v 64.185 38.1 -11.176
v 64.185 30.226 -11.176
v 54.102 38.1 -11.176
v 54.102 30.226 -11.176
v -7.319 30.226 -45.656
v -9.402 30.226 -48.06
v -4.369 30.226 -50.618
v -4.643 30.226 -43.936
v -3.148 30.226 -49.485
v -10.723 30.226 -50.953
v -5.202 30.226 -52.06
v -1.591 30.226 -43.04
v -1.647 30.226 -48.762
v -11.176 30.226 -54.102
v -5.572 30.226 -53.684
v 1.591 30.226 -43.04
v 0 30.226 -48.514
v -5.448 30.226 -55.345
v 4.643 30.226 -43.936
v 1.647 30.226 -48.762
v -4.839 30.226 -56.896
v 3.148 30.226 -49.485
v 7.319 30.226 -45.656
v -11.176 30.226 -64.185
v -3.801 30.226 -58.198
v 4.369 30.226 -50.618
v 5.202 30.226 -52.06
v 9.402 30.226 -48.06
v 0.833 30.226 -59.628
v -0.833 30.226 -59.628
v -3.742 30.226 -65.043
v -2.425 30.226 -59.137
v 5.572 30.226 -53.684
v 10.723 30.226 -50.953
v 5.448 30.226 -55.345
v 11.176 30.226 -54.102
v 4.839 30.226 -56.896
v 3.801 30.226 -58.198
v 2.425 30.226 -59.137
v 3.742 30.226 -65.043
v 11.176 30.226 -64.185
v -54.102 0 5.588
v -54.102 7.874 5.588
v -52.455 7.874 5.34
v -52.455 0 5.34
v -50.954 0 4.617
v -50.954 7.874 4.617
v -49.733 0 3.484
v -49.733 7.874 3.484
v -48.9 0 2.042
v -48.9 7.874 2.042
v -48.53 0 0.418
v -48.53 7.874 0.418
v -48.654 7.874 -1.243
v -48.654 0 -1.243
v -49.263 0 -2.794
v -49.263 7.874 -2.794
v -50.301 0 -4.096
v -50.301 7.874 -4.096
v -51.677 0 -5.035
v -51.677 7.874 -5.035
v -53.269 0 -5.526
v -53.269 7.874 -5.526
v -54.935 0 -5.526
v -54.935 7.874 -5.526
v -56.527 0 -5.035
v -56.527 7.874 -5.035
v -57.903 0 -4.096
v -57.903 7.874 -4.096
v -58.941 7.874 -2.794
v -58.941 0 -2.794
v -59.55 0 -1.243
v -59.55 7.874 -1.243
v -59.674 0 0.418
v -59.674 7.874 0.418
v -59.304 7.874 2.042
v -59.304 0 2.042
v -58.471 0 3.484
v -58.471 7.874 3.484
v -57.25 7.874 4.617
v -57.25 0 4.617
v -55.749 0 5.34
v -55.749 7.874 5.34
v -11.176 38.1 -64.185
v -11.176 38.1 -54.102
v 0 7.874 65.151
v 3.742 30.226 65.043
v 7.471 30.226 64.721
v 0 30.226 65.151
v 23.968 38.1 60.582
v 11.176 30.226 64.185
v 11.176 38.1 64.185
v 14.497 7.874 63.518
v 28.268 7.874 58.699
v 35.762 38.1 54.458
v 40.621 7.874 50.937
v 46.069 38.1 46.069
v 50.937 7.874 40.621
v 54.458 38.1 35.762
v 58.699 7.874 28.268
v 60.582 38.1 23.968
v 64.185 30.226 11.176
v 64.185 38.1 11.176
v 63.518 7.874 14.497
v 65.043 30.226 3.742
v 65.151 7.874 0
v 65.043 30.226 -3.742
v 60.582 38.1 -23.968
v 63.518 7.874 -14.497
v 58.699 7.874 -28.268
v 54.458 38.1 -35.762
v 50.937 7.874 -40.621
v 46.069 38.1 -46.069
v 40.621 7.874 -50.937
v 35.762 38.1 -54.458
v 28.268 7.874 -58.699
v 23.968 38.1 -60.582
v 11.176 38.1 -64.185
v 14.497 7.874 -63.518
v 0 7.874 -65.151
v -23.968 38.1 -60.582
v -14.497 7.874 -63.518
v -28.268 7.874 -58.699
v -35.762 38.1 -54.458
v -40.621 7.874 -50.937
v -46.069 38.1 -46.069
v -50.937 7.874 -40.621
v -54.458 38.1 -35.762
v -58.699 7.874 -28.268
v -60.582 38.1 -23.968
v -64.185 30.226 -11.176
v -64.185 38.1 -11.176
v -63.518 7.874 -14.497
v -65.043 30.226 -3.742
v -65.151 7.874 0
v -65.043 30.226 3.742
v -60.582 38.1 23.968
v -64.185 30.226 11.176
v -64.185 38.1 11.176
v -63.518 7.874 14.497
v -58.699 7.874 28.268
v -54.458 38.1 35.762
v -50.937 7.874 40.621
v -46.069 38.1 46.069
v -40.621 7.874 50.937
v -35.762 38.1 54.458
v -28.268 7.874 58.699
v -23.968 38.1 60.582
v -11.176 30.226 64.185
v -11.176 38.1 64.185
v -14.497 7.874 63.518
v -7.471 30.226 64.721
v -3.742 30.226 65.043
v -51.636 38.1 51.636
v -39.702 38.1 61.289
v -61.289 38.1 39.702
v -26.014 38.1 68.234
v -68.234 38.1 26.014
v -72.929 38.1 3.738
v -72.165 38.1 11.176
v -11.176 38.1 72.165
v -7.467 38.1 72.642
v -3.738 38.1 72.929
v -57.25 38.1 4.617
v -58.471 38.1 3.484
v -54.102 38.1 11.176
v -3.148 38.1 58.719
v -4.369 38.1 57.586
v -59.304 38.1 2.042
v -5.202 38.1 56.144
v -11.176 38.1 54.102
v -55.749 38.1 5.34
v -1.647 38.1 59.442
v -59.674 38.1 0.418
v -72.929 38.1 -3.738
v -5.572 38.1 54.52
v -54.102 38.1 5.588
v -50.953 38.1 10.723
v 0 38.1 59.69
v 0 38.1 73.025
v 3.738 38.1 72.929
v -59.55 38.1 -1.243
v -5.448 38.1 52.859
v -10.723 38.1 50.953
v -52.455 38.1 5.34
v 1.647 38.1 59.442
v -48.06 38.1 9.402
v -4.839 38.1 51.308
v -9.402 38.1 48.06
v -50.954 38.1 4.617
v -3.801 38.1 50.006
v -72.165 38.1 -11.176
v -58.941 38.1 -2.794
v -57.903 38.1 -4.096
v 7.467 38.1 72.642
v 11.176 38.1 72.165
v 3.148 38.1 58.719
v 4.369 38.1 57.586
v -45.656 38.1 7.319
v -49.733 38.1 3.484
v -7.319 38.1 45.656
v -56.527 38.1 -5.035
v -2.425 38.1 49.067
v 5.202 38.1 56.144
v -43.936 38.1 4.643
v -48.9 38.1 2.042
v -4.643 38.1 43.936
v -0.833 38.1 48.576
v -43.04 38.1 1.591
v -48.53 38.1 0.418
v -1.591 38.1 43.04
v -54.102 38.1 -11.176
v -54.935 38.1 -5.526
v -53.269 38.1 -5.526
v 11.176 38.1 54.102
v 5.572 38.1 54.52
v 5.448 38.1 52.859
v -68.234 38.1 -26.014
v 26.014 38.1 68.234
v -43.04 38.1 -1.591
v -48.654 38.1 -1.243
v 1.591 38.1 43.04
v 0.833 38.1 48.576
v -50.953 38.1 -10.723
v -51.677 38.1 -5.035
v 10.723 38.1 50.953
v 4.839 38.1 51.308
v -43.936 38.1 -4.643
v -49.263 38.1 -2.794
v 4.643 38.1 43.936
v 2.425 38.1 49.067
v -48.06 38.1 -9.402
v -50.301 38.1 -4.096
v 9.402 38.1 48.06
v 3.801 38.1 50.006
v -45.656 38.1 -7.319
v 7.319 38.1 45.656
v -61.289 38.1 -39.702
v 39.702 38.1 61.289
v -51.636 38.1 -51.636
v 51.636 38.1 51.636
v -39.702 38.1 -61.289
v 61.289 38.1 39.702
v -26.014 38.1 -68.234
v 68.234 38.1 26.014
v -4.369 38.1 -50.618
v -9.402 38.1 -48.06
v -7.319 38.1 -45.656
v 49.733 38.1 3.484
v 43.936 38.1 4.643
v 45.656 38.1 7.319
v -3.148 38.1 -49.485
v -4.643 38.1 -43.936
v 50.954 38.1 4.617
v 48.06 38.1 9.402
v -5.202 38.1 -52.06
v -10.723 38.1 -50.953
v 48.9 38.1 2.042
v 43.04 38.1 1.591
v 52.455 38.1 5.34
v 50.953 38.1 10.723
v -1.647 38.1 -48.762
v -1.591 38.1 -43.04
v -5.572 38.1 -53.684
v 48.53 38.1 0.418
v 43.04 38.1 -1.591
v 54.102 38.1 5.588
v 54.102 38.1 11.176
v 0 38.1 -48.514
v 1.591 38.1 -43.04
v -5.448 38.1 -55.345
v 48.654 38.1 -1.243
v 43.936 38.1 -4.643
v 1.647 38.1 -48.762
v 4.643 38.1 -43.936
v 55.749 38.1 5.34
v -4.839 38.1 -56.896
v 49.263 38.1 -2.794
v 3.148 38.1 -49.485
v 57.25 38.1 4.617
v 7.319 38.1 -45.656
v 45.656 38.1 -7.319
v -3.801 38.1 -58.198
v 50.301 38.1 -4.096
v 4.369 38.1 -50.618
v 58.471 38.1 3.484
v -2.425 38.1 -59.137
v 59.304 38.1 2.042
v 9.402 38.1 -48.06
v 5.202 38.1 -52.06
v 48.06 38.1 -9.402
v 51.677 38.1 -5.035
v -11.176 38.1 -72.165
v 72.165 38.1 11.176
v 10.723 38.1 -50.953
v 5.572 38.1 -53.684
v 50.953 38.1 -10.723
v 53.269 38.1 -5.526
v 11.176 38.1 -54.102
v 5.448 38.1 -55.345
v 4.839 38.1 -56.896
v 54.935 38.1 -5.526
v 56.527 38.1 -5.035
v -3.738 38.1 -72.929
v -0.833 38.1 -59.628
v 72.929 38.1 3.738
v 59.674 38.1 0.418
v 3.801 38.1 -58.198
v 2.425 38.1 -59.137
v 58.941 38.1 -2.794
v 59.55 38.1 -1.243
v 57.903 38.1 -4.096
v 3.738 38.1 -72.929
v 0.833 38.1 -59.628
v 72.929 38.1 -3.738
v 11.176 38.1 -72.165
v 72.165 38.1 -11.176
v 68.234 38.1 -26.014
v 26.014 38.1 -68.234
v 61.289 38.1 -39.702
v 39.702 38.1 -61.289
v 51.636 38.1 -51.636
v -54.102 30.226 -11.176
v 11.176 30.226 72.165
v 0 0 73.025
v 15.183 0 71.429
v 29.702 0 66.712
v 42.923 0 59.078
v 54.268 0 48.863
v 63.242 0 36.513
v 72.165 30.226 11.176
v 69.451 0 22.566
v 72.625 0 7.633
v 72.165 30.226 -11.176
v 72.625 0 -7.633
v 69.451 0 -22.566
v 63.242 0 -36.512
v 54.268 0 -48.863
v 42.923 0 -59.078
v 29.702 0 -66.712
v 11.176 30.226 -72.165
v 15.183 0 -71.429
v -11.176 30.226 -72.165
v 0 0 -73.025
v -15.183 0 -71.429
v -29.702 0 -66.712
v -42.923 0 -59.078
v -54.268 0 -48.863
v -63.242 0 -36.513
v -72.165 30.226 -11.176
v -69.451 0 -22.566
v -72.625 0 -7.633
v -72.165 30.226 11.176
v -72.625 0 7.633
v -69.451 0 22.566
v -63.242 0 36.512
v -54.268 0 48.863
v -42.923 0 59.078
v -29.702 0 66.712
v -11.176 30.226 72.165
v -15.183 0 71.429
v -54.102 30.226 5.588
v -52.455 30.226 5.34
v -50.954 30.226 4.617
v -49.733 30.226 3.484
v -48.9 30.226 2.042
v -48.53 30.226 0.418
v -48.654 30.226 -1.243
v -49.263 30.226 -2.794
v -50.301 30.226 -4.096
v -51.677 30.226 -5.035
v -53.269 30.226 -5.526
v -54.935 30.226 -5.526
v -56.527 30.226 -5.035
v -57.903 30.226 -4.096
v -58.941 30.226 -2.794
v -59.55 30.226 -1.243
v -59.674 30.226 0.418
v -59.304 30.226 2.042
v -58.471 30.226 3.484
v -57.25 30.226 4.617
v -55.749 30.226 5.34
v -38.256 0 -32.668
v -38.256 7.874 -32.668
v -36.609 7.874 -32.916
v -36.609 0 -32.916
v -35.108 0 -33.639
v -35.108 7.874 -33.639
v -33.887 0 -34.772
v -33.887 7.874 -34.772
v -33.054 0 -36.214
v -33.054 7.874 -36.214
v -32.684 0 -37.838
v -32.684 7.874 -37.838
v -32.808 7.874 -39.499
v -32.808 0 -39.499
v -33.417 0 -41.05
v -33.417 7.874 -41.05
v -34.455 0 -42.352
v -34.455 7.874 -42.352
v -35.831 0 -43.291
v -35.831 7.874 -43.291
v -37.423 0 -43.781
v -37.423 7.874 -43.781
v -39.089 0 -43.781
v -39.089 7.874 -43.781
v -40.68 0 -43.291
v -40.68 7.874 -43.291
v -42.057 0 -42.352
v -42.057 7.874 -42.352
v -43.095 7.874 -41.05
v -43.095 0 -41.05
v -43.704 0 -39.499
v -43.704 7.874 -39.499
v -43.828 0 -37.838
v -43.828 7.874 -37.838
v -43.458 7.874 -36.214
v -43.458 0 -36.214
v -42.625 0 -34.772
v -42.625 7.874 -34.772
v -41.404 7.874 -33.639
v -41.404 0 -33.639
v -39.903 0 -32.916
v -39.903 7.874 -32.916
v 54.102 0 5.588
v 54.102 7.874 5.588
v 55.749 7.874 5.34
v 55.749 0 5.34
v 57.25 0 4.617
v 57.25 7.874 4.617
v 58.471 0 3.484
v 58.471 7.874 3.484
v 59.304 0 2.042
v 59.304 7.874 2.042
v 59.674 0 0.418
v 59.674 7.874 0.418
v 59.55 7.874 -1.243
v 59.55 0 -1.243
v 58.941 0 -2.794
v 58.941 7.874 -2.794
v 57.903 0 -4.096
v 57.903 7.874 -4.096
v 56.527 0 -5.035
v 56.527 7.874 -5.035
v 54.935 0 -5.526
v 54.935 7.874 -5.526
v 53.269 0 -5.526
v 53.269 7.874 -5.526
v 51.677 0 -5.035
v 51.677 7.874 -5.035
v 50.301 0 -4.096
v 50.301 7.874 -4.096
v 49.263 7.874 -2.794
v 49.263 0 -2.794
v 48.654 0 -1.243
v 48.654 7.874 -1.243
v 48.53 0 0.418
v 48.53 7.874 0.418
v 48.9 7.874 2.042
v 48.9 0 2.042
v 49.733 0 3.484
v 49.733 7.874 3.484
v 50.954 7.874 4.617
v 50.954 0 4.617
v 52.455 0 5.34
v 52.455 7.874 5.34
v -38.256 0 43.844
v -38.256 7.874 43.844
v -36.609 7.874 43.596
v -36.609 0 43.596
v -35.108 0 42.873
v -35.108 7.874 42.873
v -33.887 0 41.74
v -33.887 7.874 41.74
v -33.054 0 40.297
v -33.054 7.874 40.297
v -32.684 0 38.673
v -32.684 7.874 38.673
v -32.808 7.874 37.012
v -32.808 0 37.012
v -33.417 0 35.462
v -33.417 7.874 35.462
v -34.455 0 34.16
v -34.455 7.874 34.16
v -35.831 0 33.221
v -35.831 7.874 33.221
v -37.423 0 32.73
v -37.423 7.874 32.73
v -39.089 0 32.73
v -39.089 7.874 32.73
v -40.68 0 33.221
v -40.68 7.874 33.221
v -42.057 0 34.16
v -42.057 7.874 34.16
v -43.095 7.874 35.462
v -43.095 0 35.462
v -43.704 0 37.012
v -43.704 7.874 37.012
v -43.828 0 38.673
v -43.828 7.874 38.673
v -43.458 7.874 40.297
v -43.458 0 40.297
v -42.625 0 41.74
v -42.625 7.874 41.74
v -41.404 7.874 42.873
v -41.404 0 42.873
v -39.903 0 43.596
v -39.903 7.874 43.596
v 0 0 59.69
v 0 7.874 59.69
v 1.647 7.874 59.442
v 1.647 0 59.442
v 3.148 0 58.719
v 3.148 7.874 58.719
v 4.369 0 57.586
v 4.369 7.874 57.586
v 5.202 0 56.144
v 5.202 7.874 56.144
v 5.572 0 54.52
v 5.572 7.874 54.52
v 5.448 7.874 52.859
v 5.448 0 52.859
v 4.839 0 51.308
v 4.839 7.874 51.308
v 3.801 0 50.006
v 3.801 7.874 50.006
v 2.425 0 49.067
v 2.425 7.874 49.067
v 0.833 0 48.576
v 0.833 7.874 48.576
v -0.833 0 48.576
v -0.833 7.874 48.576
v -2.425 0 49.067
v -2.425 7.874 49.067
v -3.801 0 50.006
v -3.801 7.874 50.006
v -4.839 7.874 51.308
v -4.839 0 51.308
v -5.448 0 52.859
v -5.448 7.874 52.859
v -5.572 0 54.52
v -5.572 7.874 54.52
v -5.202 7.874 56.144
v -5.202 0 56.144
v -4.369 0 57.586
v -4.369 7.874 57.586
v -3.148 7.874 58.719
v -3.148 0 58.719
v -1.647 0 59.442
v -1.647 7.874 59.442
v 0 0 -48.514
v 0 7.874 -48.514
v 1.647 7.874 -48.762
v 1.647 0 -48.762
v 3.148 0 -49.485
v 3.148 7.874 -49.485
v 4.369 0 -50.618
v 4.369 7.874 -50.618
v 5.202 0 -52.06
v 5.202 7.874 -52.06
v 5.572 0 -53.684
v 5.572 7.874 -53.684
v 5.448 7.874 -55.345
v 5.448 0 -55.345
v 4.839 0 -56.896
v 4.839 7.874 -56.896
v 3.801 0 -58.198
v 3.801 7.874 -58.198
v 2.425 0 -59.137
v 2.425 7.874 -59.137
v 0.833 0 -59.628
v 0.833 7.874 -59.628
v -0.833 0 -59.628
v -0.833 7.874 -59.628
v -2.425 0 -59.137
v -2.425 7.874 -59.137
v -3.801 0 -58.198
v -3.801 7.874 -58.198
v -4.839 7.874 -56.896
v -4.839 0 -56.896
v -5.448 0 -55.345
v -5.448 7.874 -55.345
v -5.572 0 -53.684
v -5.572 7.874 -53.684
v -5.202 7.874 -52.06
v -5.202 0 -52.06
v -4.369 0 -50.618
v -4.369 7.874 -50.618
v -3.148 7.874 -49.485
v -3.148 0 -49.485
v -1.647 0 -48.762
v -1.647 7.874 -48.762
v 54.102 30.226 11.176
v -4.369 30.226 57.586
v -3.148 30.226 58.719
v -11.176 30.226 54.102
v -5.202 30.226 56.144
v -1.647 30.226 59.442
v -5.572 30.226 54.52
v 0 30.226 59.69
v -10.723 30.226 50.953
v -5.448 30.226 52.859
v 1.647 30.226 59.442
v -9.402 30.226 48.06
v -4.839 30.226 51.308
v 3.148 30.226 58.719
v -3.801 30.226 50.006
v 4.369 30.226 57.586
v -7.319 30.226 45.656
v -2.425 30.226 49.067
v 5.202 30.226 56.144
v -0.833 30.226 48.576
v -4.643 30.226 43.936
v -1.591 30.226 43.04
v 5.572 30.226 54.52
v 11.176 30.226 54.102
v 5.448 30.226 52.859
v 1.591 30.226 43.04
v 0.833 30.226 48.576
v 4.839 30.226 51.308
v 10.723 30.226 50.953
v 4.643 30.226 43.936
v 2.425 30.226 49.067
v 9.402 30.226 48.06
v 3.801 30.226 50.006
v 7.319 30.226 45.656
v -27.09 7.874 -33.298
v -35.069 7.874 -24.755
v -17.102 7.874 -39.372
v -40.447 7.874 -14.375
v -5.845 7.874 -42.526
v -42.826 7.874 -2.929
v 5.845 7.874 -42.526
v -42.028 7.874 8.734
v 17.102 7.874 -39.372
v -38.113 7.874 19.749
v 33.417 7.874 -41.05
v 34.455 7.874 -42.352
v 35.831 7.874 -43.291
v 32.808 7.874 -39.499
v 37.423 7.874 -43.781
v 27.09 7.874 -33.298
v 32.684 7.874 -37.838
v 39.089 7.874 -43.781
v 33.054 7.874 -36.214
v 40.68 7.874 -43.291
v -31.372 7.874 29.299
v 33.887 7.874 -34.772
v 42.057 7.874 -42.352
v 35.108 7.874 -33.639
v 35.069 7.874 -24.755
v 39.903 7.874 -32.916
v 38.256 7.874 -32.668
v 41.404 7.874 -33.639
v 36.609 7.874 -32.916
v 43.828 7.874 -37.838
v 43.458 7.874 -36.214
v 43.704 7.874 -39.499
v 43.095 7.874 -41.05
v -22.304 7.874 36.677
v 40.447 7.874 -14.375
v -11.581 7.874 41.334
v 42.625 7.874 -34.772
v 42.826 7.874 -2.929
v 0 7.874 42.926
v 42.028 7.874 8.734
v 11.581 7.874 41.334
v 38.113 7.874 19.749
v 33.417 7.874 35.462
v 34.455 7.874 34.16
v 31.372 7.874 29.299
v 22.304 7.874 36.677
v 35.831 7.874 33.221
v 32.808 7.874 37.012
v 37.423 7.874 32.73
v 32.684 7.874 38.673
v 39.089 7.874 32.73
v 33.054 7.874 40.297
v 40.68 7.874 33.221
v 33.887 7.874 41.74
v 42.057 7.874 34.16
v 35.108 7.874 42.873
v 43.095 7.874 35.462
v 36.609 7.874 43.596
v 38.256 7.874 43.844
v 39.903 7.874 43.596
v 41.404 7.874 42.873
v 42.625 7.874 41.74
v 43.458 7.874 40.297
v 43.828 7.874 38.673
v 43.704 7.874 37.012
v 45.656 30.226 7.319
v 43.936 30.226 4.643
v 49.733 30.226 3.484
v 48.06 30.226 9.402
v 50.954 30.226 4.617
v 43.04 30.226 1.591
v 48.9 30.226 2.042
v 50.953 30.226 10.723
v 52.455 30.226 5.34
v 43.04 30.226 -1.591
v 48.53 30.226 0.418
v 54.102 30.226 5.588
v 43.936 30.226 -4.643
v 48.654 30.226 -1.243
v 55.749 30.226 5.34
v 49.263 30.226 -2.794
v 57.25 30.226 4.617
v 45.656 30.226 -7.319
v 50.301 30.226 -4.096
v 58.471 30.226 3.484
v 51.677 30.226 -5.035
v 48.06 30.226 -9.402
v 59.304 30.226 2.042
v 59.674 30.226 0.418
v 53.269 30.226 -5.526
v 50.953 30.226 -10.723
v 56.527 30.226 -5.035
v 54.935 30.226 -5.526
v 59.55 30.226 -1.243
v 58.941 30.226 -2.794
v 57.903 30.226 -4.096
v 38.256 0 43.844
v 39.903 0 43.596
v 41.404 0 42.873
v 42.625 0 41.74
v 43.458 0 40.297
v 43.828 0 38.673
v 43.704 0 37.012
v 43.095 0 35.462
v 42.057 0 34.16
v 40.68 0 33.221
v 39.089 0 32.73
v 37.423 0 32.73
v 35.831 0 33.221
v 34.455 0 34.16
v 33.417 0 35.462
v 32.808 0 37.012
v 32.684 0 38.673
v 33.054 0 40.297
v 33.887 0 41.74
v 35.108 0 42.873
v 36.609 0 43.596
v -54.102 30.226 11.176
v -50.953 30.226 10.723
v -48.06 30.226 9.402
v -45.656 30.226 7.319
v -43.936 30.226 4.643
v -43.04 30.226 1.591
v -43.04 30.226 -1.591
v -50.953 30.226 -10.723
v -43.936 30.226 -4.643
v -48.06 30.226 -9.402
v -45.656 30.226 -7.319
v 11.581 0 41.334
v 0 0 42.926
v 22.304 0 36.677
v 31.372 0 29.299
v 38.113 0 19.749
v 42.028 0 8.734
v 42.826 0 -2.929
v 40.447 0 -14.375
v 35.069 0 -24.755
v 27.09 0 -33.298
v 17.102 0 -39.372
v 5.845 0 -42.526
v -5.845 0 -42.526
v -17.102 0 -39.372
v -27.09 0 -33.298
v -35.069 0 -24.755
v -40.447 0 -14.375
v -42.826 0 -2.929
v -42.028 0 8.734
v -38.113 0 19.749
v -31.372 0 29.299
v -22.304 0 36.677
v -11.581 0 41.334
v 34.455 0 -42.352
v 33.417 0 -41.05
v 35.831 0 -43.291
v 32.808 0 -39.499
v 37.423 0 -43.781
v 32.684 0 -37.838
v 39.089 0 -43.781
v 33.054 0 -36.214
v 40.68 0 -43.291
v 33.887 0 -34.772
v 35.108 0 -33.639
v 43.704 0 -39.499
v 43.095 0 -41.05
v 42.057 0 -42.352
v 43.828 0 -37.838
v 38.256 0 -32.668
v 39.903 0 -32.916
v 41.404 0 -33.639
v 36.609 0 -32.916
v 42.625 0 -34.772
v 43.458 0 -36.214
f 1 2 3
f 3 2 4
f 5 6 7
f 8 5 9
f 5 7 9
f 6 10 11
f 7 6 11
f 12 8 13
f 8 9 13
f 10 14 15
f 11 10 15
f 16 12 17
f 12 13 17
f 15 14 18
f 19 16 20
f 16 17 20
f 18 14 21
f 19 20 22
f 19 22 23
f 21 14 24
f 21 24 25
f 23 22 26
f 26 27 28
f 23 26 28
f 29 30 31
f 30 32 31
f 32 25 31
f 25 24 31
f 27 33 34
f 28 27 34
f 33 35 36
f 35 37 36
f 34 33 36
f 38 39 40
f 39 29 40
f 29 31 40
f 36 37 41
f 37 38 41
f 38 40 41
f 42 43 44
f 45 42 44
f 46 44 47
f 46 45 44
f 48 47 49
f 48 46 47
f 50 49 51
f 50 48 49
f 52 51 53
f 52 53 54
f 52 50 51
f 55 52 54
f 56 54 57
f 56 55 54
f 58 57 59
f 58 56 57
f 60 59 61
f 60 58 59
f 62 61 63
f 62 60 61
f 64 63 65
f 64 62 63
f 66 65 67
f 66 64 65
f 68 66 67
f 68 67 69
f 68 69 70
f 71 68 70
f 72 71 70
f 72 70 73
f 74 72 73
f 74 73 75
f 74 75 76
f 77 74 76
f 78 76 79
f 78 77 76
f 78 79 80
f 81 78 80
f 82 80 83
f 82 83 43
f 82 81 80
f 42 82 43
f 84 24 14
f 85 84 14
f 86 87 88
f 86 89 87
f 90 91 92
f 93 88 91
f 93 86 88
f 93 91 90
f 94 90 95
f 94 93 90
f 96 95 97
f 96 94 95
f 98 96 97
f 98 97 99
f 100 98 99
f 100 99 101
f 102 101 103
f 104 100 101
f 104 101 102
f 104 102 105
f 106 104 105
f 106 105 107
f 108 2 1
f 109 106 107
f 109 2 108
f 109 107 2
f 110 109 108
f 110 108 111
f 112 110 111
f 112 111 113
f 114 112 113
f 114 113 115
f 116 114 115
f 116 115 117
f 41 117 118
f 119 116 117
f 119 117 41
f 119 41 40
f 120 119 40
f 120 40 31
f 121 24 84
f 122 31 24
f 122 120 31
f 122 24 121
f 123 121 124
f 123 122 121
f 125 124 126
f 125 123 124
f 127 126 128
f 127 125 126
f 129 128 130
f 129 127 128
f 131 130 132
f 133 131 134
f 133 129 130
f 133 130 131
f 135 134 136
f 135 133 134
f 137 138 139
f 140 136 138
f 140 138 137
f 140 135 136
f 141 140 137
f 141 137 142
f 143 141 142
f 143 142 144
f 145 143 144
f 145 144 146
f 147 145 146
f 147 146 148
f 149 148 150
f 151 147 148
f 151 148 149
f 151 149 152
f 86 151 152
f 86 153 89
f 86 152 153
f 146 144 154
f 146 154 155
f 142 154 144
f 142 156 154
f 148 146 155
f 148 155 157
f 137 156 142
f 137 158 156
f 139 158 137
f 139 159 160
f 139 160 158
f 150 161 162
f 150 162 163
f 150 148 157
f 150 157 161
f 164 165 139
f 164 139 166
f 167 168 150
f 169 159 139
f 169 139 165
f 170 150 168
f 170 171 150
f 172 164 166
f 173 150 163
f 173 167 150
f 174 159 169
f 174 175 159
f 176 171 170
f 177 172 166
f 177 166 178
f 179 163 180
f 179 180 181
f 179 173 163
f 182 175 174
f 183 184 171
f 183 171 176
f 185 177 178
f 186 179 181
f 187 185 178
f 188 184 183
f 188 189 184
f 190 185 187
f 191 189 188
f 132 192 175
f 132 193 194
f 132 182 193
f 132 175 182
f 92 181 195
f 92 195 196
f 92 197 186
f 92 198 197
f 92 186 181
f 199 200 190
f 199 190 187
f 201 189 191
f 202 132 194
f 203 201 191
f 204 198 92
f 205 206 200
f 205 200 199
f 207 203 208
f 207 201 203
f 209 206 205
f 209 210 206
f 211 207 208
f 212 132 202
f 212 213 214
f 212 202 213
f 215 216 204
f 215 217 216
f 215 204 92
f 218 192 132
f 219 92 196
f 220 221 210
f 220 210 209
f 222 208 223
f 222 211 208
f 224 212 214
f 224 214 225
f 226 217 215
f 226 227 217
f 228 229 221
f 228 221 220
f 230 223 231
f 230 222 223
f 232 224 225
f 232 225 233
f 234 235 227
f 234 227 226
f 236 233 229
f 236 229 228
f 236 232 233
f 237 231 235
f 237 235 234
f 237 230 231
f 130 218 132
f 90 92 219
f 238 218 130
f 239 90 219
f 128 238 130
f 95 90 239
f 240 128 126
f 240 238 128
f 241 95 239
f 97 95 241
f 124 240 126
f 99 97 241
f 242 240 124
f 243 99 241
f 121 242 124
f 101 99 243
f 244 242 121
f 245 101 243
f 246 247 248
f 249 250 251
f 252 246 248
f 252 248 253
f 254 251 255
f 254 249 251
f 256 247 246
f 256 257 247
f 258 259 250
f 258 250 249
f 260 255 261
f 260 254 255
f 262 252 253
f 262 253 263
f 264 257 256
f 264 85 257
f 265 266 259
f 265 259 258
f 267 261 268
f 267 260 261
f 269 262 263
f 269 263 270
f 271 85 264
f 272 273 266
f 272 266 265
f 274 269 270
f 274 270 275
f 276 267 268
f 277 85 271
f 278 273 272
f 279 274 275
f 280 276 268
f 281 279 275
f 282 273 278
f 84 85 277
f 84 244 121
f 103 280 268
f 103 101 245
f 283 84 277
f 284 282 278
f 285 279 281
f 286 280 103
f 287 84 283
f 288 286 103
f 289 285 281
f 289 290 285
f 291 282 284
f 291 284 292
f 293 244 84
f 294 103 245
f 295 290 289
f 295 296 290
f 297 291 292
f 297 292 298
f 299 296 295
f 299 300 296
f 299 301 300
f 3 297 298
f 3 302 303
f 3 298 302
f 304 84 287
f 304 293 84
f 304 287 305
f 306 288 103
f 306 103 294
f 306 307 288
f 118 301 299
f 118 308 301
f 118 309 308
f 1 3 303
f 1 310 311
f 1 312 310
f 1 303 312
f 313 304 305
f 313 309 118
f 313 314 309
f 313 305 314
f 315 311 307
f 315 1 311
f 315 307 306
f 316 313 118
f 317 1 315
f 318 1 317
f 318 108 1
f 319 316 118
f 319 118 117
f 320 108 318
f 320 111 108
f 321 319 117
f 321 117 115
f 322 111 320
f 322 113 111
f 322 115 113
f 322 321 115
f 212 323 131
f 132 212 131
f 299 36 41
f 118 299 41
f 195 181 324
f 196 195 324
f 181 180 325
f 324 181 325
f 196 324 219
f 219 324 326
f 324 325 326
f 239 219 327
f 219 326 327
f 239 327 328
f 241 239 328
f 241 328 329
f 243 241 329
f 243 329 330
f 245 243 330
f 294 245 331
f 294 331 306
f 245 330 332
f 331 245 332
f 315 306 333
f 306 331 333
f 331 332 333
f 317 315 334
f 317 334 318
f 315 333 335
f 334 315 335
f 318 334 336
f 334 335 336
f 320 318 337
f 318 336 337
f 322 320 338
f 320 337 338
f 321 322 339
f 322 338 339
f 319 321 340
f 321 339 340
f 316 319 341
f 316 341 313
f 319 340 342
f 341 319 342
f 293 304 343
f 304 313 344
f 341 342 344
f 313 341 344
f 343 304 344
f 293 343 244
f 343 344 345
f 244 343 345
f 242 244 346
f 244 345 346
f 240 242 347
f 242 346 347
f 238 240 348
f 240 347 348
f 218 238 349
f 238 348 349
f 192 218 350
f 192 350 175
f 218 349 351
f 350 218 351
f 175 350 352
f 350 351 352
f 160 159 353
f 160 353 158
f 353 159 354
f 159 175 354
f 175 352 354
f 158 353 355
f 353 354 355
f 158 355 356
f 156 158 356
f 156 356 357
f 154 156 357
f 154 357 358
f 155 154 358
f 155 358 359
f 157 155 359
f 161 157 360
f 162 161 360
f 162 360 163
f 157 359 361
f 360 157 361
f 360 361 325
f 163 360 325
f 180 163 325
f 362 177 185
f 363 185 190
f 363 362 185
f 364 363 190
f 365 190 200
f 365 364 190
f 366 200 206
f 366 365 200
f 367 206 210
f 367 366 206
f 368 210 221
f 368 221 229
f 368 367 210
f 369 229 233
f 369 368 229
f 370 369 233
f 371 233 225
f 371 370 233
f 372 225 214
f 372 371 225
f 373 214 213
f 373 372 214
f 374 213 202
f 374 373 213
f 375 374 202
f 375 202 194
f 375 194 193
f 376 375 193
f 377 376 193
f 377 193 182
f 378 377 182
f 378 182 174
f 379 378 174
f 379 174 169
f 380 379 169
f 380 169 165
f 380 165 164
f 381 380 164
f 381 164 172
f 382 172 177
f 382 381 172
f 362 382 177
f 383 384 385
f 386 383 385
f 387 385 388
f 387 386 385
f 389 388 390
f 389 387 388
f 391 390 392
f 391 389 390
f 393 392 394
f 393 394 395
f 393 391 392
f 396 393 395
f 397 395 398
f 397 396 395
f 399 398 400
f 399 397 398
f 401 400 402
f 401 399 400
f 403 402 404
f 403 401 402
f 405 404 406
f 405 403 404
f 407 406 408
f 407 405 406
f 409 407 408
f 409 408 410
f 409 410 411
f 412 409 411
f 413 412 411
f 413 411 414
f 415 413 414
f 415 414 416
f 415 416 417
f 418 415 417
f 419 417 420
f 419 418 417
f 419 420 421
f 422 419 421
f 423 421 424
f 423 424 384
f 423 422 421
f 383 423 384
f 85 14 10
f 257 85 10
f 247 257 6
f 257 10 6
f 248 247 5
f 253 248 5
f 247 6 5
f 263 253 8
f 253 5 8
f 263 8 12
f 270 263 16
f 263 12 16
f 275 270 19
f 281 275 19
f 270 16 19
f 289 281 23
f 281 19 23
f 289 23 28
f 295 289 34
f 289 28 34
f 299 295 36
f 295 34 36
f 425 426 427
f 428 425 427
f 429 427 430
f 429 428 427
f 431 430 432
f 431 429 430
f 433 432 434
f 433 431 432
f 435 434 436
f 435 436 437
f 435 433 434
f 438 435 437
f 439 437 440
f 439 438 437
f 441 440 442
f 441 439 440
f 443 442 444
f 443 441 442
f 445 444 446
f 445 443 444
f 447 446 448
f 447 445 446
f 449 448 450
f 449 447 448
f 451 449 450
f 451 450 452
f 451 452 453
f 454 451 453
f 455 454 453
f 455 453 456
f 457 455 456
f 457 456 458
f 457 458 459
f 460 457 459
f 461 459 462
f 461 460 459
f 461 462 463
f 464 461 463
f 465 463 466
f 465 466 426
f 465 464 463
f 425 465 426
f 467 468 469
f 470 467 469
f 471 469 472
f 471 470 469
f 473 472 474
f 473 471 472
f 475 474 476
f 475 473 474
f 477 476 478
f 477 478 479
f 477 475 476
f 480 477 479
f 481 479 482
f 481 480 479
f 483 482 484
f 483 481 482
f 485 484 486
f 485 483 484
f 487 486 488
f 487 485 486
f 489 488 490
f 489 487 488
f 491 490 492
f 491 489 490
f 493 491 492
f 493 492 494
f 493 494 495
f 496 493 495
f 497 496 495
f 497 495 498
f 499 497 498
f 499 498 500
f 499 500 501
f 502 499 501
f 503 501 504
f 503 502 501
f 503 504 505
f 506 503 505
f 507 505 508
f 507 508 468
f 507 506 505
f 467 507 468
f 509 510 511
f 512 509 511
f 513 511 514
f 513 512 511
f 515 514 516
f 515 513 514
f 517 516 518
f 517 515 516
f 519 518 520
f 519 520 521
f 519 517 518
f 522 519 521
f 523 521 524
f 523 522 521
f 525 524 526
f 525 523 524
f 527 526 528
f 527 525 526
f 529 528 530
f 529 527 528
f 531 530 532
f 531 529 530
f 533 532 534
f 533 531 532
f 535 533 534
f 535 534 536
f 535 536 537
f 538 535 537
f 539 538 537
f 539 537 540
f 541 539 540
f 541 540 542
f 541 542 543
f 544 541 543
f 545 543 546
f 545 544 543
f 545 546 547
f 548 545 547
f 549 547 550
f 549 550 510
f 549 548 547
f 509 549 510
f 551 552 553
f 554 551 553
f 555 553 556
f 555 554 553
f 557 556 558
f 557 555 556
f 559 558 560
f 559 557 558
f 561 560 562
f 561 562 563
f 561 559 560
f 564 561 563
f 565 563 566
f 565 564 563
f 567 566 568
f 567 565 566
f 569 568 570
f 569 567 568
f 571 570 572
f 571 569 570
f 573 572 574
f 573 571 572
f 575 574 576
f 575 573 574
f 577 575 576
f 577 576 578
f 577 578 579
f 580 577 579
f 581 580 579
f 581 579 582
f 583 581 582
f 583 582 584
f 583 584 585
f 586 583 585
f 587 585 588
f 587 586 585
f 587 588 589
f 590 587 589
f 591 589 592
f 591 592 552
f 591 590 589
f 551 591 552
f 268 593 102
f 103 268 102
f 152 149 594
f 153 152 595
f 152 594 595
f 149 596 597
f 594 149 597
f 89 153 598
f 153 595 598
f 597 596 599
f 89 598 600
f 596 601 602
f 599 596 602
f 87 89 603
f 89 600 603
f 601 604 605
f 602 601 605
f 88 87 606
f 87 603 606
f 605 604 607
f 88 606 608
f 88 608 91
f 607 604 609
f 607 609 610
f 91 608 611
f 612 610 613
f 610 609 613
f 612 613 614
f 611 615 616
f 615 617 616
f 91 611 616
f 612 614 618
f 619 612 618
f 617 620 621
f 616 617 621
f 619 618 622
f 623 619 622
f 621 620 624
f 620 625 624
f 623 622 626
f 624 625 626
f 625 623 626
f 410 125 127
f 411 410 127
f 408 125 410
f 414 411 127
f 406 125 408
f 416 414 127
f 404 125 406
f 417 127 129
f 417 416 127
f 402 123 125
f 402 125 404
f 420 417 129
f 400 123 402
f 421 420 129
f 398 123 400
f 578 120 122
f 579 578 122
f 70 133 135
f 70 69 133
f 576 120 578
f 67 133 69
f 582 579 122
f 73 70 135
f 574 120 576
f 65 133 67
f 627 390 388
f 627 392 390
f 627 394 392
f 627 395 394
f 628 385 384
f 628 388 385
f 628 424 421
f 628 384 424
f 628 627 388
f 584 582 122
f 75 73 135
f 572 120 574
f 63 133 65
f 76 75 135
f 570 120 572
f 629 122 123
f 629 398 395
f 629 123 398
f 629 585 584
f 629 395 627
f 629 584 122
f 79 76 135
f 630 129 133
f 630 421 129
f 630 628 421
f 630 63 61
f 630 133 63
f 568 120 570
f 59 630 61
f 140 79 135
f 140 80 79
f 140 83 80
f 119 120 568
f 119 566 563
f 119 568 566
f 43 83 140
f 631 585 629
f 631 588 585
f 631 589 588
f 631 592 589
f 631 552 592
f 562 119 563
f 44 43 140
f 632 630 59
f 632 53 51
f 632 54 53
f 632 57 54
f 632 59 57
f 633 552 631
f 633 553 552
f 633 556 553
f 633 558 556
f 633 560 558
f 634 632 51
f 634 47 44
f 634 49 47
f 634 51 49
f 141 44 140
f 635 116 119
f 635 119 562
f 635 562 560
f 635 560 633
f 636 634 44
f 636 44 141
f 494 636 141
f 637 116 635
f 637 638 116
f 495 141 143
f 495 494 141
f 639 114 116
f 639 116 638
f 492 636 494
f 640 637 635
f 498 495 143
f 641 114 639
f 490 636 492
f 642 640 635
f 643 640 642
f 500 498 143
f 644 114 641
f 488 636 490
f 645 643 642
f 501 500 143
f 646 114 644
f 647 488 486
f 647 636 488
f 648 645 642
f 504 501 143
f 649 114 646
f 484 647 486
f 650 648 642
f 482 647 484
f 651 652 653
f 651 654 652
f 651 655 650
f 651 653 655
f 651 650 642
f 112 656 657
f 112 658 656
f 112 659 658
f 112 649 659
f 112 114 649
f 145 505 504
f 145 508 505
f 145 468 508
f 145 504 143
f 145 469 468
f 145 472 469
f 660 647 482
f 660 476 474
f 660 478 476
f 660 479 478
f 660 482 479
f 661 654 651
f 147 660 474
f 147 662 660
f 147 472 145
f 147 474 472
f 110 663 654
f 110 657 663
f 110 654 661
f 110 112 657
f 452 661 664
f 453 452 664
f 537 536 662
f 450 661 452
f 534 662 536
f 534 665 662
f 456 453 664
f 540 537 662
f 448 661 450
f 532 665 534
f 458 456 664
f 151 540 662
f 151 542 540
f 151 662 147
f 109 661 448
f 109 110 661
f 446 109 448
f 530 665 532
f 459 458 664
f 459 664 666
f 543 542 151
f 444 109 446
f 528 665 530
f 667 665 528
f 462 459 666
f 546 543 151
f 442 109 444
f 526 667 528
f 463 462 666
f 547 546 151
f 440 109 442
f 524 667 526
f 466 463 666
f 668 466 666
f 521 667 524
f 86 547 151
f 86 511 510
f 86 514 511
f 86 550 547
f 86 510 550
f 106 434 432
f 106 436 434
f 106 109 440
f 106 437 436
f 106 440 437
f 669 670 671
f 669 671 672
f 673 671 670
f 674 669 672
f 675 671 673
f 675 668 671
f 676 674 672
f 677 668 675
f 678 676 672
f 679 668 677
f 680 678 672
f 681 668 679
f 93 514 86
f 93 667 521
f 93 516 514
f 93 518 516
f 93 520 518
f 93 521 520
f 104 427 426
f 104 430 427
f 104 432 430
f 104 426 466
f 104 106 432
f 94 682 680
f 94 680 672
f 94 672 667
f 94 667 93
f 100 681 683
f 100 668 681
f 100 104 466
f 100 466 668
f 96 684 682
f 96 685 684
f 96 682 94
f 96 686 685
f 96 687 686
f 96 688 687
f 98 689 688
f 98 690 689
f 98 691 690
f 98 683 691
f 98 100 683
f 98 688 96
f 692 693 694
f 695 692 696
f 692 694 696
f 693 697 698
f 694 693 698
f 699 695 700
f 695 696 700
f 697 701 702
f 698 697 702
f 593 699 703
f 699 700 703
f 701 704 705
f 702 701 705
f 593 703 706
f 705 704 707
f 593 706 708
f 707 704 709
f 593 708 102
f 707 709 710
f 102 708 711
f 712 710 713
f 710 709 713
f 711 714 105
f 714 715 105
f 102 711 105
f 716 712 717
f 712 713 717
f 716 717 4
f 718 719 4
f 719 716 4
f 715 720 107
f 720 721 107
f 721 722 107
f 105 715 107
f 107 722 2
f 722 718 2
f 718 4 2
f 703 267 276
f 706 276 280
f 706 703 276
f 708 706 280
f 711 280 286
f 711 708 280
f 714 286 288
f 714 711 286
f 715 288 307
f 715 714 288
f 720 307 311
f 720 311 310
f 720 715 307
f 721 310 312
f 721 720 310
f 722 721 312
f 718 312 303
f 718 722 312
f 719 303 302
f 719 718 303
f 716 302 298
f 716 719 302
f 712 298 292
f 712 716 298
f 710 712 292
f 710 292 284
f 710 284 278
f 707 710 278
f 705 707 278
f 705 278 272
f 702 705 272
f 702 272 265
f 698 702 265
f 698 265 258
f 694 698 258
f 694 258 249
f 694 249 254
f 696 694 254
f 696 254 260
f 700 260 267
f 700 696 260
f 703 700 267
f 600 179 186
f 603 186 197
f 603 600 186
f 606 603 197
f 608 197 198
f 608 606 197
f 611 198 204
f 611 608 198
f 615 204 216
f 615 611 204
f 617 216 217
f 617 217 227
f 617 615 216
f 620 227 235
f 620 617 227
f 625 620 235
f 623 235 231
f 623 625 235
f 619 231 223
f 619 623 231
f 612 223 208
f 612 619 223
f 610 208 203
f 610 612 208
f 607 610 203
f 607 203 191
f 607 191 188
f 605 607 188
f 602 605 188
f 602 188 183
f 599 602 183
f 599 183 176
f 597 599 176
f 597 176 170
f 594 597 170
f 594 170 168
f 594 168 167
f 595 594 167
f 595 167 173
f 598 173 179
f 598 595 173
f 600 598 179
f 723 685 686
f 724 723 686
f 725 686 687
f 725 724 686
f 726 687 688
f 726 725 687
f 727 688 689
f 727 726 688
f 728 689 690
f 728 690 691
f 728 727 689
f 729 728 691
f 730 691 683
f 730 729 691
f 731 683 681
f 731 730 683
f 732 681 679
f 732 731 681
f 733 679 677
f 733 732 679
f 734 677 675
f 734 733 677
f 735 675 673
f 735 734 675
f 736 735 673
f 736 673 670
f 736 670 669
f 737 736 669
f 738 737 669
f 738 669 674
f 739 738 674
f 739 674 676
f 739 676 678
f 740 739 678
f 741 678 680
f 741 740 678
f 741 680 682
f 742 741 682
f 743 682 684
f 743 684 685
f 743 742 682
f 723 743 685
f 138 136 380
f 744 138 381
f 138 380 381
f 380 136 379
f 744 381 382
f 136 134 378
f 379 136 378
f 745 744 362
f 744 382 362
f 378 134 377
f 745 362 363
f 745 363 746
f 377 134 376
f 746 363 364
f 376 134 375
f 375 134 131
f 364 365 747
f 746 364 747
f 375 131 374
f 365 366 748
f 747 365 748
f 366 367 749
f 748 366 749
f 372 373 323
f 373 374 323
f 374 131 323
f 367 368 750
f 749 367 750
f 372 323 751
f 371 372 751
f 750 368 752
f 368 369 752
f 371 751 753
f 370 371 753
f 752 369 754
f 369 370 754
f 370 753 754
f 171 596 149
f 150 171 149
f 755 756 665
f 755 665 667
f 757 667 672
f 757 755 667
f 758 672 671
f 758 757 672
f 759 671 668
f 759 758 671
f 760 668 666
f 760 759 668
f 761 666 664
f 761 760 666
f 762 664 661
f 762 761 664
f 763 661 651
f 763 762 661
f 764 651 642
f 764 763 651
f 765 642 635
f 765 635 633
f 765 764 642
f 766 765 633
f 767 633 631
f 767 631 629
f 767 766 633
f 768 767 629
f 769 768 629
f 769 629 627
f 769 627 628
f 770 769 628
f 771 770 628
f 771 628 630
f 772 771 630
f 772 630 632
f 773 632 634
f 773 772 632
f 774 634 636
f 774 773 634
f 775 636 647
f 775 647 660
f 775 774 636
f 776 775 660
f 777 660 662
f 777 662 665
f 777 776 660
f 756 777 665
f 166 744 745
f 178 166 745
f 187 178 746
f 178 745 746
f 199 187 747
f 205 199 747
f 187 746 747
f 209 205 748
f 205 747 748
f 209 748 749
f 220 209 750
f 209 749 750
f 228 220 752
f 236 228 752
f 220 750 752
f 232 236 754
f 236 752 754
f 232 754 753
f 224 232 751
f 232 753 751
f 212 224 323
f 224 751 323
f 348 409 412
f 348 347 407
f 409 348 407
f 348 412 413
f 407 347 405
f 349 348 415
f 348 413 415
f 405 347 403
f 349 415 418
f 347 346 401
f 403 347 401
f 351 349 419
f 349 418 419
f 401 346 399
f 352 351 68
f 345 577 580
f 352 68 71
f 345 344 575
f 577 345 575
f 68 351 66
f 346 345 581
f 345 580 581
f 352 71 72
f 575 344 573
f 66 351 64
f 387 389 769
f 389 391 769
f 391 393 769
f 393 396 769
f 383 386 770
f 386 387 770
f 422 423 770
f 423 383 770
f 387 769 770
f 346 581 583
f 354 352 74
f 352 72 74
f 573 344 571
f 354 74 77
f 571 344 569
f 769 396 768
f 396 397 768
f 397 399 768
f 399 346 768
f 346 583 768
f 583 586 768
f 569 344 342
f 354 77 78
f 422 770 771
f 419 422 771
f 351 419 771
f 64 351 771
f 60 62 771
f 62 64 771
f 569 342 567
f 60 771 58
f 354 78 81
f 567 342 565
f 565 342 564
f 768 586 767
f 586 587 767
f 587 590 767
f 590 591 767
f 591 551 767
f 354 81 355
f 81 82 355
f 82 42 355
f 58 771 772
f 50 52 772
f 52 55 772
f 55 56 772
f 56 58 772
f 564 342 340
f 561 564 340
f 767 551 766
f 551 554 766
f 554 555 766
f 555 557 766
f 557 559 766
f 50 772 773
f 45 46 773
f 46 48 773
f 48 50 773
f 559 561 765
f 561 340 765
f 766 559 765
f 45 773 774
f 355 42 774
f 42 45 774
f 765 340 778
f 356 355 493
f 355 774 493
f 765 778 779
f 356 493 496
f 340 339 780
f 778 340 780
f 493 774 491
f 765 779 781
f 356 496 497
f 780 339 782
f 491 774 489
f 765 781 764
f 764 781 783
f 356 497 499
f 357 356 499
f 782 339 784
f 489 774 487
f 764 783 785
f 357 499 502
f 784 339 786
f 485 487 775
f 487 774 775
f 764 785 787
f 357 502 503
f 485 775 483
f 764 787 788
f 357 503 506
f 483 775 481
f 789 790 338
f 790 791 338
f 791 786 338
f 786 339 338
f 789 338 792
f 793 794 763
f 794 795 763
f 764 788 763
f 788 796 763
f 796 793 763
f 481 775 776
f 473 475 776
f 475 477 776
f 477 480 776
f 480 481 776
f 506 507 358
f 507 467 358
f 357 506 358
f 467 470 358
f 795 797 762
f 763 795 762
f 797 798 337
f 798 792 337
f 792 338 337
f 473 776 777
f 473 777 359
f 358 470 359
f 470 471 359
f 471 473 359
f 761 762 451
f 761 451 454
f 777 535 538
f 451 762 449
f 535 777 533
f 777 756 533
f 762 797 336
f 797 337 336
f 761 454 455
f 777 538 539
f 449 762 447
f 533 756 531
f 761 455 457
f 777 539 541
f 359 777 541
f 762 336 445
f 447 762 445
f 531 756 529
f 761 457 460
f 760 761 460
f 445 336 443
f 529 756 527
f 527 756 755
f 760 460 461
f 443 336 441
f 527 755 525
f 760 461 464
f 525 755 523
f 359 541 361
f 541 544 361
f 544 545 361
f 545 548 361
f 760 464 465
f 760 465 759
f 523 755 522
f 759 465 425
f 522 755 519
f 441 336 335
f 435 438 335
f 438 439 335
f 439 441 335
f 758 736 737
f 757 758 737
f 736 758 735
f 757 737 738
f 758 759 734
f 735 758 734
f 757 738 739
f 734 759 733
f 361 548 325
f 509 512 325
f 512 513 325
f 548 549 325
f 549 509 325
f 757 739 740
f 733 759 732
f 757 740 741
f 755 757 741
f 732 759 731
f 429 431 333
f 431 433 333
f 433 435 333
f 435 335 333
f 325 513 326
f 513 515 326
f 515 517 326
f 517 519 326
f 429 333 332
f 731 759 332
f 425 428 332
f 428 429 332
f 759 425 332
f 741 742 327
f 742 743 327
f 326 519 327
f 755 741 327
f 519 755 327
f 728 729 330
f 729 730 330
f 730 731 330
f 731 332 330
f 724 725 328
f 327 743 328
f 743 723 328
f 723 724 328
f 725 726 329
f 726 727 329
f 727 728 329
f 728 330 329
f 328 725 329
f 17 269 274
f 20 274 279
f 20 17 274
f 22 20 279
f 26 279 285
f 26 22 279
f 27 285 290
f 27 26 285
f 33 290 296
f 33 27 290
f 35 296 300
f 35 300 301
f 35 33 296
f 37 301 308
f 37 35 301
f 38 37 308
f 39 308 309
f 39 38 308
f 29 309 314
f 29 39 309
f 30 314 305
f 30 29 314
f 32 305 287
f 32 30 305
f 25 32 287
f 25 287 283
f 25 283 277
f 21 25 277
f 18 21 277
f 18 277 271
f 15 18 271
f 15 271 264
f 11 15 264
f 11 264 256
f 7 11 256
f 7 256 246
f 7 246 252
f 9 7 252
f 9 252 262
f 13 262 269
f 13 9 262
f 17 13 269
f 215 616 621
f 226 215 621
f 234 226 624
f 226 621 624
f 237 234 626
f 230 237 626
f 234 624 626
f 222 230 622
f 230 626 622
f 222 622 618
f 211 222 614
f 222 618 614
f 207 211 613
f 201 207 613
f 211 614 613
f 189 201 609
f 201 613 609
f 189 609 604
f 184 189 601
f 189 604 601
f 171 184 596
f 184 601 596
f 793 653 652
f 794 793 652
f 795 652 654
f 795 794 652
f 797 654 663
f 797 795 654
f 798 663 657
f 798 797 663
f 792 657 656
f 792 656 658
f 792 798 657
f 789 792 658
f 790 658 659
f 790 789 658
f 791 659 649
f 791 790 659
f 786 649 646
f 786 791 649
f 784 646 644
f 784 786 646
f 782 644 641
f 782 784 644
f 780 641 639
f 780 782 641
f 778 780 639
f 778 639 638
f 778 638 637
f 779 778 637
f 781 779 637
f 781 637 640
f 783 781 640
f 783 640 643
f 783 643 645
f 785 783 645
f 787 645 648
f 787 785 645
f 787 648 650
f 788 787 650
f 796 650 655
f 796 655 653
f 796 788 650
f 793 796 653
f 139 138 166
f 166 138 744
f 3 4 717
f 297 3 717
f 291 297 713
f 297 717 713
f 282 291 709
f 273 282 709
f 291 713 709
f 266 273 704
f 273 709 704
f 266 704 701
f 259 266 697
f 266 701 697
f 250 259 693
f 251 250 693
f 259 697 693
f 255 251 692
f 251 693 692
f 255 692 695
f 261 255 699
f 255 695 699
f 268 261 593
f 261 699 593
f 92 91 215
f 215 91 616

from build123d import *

# Parameters (mm, degrees)
SKETCH11_R          = 73.025
SKETCH11_R_2        = 42.926
SKETCH11_R_3        = 5.588
BOSS_EXTRUDE3_DEPTH = 7.874
SKETCH12_R          = 73.025
SKETCH12_R_2        = 65.151
BOSS_EXTRUDE4_DEPTH = 30.226
BOSS_EXTRUDE5_START = -7.874
SKETCH19_R          = 5.588
BOSS_EXTRUDE5_DEPTH = 7.874


with BuildPart() as part:
    # Sketch11 → Boss-Extrude3 (new body)
    with BuildSketch(Plane(origin=(0, 0, 0), x_dir=(1, 0, 0), z_dir=(0, 1, 0))):
        with Locations(Location((0, 0, 0), (0, 0, 270))):
            Circle(SKETCH11_R)
        with Locations(Location((0, 0, 0), (0, 0, 270))):
            Circle(SKETCH11_R_2, mode=Mode.SUBTRACT)
        with Locations(Location((0, -54.102, 0), (0, 0, 270))):
            Circle(SKETCH11_R_3, mode=Mode.SUBTRACT)
        with Locations(Location((-38.255891076, -38.255891076, 0), (0, 0, 270))):
            Circle(SKETCH11_R_3, mode=Mode.SUBTRACT)
        with Locations(Location((-54.102, 0, 0), (0, 0, 270))):
            Circle(SKETCH11_R_3, mode=Mode.SUBTRACT)
        with Locations(Location((-38.255891076, 38.255891076, 0), (0, 0, 270))):
            Circle(SKETCH11_R_3, mode=Mode.SUBTRACT)
        with Locations(Location((0, 54.102, 0), (0, 0, 270))):
            Circle(SKETCH11_R_3, mode=Mode.SUBTRACT)
        with Locations(Location((38.255891076, 38.255891076, 0), (0, 0, 270))):
            Circle(SKETCH11_R_3, mode=Mode.SUBTRACT)
        with Locations(Location((54.102, 0, 0), (0, 0, 270))):
            Circle(SKETCH11_R_3, mode=Mode.SUBTRACT)
        with Locations(Location((38.255891076, -38.255891076, 0), (0, 0, 270))):
            Circle(SKETCH11_R_3, mode=Mode.SUBTRACT)
    extrude(amount=BOSS_EXTRUDE3_DEPTH)

    # Sketch12 → Boss-Extrude4 (add)
    with BuildSketch(Plane(origin=(0, 7.874, 0), x_dir=(1, 0, 0), z_dir=(0, 1, 0))):
        with Locations(Location((0, 0, 0), (0, 0, 270))):
            Circle(SKETCH12_R)
        with Locations(Location((0, 0, 0), (0, 0, 270))):
            Circle(SKETCH12_R_2, mode=Mode.SUBTRACT)
    extrude(amount=BOSS_EXTRUDE4_DEPTH)

    # Sketch19 → Boss-Extrude5 (add)
    # profile 1 of 4: a face of its own
    with BuildSketch(Plane(origin=(0, 38.1, 0), x_dir=(1, 0, 0), z_dir=(0, 1, 0)).offset(BOSS_EXTRUDE5_START)):
        with BuildLine():
            Line((-11.176, -54.102), (-11.176, -72.164725795))
            Line((-11.176, -72.164725795), (11.176, -72.164725795))
            Line((11.176, -72.164725795), (11.176, -54.102))
            ThreePointArc((11.176, -54.102), (0, -42.926), (-11.176, -54.102))
        make_face()
        with Locations(Location((0, -54.102, 0), (0, 0, 270))):
            Circle(SKETCH19_R, mode=Mode.SUBTRACT)
    # profile 2 of 4: a face of its own
    with BuildSketch(Plane(origin=(0, 38.1, 0), x_dir=(1, 0, 0), z_dir=(0, 1, 0)).offset(BOSS_EXTRUDE5_START)):
        with BuildLine():
            Line((-54.102, 11.176), (-72.164725795, 11.176))
            Line((-72.164725795, 11.176), (-72.164725795, -11.176))
            Line((-72.164725795, -11.176), (-54.102, -11.176))
            ThreePointArc((-54.102, -11.176), (-42.926, 0), (-54.102, 11.176))
        make_face()
        with Locations(Location((-54.102, 0, 0), (0, 0, 270))):
            Circle(SKETCH19_R, mode=Mode.SUBTRACT)
    # profile 3 of 4: a face of its own
    with BuildSketch(Plane(origin=(0, 38.1, 0), x_dir=(1, 0, 0), z_dir=(0, 1, 0)).offset(BOSS_EXTRUDE5_START)):
        with BuildLine():
            Line((11.176, 54.102), (11.176, 72.164725795))
            Line((11.176, 72.164725795), (-11.176, 72.164725795))
            Line((-11.176, 72.164725795), (-11.176, 54.102))
            ThreePointArc((-11.176, 54.102), (0, 42.926), (11.176, 54.102))
        make_face()
        with Locations(Location((0, 54.102, 0), (0, 0, 270))):
            Circle(SKETCH19_R, mode=Mode.SUBTRACT)
    # profile 4 of 4: a face of its own
    with BuildSketch(Plane(origin=(0, 38.1, 0), x_dir=(1, 0, 0), z_dir=(0, 1, 0)).offset(BOSS_EXTRUDE5_START)):
        with BuildLine():
            Line((54.102, -11.176), (72.164725795, -11.176))
            Line((72.164725795, -11.176), (72.164725795, 11.176))
            Line((72.164725795, 11.176), (54.102, 11.176))
            ThreePointArc((54.102, 11.176), (42.926, 0), (54.102, -11.176))
        make_face()
        with Locations(Location((54.102, 0, 0), (0, 0, 270))):
            Circle(SKETCH19_R, mode=Mode.SUBTRACT)
    extrude(amount=BOSS_EXTRUDE5_DEPTH)


solid = part.part
